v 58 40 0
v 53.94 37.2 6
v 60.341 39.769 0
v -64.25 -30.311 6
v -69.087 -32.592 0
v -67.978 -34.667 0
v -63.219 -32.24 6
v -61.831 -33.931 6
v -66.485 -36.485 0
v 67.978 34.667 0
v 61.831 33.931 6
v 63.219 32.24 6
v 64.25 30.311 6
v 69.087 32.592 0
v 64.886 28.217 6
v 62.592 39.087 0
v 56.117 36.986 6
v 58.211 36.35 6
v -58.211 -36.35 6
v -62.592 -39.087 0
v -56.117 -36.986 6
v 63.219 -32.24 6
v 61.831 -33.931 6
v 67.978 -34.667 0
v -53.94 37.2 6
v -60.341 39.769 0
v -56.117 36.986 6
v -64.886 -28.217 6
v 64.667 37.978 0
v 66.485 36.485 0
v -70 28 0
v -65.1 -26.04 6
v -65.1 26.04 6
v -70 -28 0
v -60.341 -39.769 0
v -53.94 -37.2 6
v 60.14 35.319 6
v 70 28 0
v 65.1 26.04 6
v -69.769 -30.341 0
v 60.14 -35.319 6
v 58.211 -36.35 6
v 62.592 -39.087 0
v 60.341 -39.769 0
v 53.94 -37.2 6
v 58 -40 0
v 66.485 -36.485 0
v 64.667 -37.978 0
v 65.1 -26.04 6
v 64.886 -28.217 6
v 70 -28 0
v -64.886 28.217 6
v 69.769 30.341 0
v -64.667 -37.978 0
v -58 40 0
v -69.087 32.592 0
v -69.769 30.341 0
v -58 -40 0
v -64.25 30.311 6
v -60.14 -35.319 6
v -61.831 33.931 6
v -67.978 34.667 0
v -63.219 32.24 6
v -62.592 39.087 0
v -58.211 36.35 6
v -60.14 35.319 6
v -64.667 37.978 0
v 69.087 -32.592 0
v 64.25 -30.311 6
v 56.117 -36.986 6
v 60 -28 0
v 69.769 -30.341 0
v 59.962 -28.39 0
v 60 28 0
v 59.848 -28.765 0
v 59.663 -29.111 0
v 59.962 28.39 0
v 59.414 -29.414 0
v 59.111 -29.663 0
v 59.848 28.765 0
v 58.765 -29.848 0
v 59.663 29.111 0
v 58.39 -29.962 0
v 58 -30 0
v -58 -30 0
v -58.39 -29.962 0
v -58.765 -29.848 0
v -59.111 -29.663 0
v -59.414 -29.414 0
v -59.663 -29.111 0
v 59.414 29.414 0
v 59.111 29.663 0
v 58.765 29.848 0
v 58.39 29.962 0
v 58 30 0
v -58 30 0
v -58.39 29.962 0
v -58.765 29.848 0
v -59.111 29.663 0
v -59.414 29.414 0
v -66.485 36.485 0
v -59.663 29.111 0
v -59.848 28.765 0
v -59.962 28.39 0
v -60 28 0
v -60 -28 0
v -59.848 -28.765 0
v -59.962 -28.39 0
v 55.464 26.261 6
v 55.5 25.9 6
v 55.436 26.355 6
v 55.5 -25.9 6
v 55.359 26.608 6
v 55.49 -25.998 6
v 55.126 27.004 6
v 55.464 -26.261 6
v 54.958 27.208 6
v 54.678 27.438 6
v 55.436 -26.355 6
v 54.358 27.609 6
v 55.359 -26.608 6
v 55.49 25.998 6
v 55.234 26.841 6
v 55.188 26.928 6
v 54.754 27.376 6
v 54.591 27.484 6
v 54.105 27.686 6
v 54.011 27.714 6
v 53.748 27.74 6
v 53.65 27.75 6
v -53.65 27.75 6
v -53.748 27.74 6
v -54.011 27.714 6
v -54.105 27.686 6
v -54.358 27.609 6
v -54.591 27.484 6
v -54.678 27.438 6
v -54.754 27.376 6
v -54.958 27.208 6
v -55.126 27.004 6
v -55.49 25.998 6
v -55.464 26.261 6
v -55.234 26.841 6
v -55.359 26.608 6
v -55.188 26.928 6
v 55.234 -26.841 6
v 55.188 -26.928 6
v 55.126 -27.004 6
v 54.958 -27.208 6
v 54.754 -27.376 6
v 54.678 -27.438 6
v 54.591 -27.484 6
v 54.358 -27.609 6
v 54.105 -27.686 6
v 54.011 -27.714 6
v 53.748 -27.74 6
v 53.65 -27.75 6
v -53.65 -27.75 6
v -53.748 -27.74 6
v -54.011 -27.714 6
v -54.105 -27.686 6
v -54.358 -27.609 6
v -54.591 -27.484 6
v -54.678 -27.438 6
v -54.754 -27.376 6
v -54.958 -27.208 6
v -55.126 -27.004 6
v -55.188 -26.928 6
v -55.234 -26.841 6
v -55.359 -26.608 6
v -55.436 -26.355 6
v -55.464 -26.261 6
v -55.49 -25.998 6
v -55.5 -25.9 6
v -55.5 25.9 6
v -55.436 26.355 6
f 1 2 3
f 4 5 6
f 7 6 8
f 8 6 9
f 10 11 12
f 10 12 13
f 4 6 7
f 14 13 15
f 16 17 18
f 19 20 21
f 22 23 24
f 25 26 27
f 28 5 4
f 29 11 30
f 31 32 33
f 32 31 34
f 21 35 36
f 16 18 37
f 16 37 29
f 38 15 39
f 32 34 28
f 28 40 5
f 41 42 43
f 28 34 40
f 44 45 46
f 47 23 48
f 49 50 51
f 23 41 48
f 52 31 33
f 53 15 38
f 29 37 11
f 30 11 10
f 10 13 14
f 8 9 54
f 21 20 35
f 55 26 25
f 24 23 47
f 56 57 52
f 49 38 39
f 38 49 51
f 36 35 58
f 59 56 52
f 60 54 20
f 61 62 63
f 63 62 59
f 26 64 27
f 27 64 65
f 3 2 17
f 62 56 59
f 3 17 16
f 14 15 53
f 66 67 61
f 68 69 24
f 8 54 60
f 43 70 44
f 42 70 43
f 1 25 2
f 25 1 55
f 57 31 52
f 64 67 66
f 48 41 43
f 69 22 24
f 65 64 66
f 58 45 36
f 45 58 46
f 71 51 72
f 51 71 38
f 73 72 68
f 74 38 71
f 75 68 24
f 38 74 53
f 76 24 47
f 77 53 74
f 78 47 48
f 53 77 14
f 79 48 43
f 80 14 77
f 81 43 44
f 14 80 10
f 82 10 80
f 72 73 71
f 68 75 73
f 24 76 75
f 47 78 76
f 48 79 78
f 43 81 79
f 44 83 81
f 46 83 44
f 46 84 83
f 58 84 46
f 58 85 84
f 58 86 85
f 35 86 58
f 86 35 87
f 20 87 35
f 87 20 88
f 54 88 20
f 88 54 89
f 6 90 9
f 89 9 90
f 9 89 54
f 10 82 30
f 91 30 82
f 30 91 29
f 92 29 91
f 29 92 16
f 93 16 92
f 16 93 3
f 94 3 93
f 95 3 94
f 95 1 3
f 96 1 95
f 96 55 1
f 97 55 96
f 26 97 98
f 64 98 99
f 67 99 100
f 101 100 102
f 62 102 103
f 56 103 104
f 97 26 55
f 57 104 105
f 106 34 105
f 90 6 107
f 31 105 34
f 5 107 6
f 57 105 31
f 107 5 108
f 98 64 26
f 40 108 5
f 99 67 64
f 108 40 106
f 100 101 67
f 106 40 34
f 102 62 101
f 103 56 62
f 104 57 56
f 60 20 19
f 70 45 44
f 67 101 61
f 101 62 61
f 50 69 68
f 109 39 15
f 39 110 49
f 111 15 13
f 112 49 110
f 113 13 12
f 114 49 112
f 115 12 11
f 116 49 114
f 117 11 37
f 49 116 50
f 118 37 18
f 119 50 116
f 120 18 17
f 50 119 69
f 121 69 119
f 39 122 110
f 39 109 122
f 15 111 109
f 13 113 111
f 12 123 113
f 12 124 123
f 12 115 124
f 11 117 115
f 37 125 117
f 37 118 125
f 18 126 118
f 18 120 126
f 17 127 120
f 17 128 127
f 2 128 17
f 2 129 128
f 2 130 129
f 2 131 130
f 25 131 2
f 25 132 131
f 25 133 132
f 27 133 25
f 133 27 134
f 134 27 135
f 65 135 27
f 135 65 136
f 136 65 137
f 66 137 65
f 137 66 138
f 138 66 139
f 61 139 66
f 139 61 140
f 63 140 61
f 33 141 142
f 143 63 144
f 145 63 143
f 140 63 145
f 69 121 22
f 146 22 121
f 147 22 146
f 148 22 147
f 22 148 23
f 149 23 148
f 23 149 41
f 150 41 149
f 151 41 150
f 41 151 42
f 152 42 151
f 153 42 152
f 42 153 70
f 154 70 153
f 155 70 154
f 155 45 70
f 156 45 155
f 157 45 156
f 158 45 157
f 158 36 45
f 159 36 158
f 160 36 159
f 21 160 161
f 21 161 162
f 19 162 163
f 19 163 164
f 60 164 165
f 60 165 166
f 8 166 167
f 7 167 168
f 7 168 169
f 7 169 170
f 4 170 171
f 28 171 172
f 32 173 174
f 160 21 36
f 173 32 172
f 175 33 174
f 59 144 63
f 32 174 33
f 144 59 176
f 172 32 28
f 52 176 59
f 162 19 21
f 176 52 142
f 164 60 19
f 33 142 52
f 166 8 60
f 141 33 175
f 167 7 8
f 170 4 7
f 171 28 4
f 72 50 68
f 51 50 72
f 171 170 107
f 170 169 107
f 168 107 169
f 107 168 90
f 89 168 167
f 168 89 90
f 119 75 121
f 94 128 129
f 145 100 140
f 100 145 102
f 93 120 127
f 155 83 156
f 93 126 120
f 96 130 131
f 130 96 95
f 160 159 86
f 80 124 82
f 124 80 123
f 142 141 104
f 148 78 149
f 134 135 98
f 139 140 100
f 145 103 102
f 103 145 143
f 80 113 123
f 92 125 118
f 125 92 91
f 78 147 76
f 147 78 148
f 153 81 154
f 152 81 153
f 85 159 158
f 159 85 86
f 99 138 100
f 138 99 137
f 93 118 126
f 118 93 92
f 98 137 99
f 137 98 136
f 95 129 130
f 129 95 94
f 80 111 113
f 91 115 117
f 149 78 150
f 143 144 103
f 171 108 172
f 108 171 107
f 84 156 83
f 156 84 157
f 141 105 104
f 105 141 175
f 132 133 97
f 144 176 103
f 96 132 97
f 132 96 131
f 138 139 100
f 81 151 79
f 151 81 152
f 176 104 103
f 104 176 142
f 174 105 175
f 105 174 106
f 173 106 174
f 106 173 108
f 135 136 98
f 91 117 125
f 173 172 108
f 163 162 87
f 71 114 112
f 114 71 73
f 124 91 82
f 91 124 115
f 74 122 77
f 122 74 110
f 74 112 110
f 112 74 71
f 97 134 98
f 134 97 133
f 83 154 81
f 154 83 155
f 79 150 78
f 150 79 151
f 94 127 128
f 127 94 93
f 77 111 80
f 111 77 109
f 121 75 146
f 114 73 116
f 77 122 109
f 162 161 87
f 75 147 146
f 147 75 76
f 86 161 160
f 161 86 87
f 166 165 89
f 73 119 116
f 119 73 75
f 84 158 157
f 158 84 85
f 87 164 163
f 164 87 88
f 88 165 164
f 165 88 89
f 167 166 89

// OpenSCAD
$fn = 32;

// ----------------------------------------------------------------------
// Display bezel: 140 x 80 mm frame, opening 120x60 mm
// ----------------------------------------------------------------------

// --- parameters (mm) ---
length = 140;             // frame outside length, X
width = 80;               // frame outside width, Y
frame_w = 10;             // frame width
thickness = 6;            // frame thickness
corner_r = 12;            // outside corner radius
chamfer = 0.93;           // outer wall taper
funnel = 0.9;             // inner opening taper
opening_l = 120;          // opening length
opening_w = 60;           // opening width
inner_r = 2;              // opening corner radius

/* rounded-rectangle outlines, generated with loops */
module rounded_ring(l_nom, w_nom, r) {
  hull() {
    for (sx = [-1, 1]) for (sy = [-1, 1])
      translate([sx * (l_nom / 2 - r), sy * (w_nom / 2 - r)]) circle(r = r);
  }
}

difference() {
  /* frame body, drafted so the outer edge is a variable-depth chamfer */
  linear_extrude(height = thickness, scale = chamfer)
    rounded_ring(length, width, corner_r);
  /* viewing opening, drafted the other way for a funnel edge */
  linear_extrude(height = thickness + 2, scale = funnel)
    translate([0, 0, -1]) rounded_ring(opening_l, opening_w, inner_r);
}
